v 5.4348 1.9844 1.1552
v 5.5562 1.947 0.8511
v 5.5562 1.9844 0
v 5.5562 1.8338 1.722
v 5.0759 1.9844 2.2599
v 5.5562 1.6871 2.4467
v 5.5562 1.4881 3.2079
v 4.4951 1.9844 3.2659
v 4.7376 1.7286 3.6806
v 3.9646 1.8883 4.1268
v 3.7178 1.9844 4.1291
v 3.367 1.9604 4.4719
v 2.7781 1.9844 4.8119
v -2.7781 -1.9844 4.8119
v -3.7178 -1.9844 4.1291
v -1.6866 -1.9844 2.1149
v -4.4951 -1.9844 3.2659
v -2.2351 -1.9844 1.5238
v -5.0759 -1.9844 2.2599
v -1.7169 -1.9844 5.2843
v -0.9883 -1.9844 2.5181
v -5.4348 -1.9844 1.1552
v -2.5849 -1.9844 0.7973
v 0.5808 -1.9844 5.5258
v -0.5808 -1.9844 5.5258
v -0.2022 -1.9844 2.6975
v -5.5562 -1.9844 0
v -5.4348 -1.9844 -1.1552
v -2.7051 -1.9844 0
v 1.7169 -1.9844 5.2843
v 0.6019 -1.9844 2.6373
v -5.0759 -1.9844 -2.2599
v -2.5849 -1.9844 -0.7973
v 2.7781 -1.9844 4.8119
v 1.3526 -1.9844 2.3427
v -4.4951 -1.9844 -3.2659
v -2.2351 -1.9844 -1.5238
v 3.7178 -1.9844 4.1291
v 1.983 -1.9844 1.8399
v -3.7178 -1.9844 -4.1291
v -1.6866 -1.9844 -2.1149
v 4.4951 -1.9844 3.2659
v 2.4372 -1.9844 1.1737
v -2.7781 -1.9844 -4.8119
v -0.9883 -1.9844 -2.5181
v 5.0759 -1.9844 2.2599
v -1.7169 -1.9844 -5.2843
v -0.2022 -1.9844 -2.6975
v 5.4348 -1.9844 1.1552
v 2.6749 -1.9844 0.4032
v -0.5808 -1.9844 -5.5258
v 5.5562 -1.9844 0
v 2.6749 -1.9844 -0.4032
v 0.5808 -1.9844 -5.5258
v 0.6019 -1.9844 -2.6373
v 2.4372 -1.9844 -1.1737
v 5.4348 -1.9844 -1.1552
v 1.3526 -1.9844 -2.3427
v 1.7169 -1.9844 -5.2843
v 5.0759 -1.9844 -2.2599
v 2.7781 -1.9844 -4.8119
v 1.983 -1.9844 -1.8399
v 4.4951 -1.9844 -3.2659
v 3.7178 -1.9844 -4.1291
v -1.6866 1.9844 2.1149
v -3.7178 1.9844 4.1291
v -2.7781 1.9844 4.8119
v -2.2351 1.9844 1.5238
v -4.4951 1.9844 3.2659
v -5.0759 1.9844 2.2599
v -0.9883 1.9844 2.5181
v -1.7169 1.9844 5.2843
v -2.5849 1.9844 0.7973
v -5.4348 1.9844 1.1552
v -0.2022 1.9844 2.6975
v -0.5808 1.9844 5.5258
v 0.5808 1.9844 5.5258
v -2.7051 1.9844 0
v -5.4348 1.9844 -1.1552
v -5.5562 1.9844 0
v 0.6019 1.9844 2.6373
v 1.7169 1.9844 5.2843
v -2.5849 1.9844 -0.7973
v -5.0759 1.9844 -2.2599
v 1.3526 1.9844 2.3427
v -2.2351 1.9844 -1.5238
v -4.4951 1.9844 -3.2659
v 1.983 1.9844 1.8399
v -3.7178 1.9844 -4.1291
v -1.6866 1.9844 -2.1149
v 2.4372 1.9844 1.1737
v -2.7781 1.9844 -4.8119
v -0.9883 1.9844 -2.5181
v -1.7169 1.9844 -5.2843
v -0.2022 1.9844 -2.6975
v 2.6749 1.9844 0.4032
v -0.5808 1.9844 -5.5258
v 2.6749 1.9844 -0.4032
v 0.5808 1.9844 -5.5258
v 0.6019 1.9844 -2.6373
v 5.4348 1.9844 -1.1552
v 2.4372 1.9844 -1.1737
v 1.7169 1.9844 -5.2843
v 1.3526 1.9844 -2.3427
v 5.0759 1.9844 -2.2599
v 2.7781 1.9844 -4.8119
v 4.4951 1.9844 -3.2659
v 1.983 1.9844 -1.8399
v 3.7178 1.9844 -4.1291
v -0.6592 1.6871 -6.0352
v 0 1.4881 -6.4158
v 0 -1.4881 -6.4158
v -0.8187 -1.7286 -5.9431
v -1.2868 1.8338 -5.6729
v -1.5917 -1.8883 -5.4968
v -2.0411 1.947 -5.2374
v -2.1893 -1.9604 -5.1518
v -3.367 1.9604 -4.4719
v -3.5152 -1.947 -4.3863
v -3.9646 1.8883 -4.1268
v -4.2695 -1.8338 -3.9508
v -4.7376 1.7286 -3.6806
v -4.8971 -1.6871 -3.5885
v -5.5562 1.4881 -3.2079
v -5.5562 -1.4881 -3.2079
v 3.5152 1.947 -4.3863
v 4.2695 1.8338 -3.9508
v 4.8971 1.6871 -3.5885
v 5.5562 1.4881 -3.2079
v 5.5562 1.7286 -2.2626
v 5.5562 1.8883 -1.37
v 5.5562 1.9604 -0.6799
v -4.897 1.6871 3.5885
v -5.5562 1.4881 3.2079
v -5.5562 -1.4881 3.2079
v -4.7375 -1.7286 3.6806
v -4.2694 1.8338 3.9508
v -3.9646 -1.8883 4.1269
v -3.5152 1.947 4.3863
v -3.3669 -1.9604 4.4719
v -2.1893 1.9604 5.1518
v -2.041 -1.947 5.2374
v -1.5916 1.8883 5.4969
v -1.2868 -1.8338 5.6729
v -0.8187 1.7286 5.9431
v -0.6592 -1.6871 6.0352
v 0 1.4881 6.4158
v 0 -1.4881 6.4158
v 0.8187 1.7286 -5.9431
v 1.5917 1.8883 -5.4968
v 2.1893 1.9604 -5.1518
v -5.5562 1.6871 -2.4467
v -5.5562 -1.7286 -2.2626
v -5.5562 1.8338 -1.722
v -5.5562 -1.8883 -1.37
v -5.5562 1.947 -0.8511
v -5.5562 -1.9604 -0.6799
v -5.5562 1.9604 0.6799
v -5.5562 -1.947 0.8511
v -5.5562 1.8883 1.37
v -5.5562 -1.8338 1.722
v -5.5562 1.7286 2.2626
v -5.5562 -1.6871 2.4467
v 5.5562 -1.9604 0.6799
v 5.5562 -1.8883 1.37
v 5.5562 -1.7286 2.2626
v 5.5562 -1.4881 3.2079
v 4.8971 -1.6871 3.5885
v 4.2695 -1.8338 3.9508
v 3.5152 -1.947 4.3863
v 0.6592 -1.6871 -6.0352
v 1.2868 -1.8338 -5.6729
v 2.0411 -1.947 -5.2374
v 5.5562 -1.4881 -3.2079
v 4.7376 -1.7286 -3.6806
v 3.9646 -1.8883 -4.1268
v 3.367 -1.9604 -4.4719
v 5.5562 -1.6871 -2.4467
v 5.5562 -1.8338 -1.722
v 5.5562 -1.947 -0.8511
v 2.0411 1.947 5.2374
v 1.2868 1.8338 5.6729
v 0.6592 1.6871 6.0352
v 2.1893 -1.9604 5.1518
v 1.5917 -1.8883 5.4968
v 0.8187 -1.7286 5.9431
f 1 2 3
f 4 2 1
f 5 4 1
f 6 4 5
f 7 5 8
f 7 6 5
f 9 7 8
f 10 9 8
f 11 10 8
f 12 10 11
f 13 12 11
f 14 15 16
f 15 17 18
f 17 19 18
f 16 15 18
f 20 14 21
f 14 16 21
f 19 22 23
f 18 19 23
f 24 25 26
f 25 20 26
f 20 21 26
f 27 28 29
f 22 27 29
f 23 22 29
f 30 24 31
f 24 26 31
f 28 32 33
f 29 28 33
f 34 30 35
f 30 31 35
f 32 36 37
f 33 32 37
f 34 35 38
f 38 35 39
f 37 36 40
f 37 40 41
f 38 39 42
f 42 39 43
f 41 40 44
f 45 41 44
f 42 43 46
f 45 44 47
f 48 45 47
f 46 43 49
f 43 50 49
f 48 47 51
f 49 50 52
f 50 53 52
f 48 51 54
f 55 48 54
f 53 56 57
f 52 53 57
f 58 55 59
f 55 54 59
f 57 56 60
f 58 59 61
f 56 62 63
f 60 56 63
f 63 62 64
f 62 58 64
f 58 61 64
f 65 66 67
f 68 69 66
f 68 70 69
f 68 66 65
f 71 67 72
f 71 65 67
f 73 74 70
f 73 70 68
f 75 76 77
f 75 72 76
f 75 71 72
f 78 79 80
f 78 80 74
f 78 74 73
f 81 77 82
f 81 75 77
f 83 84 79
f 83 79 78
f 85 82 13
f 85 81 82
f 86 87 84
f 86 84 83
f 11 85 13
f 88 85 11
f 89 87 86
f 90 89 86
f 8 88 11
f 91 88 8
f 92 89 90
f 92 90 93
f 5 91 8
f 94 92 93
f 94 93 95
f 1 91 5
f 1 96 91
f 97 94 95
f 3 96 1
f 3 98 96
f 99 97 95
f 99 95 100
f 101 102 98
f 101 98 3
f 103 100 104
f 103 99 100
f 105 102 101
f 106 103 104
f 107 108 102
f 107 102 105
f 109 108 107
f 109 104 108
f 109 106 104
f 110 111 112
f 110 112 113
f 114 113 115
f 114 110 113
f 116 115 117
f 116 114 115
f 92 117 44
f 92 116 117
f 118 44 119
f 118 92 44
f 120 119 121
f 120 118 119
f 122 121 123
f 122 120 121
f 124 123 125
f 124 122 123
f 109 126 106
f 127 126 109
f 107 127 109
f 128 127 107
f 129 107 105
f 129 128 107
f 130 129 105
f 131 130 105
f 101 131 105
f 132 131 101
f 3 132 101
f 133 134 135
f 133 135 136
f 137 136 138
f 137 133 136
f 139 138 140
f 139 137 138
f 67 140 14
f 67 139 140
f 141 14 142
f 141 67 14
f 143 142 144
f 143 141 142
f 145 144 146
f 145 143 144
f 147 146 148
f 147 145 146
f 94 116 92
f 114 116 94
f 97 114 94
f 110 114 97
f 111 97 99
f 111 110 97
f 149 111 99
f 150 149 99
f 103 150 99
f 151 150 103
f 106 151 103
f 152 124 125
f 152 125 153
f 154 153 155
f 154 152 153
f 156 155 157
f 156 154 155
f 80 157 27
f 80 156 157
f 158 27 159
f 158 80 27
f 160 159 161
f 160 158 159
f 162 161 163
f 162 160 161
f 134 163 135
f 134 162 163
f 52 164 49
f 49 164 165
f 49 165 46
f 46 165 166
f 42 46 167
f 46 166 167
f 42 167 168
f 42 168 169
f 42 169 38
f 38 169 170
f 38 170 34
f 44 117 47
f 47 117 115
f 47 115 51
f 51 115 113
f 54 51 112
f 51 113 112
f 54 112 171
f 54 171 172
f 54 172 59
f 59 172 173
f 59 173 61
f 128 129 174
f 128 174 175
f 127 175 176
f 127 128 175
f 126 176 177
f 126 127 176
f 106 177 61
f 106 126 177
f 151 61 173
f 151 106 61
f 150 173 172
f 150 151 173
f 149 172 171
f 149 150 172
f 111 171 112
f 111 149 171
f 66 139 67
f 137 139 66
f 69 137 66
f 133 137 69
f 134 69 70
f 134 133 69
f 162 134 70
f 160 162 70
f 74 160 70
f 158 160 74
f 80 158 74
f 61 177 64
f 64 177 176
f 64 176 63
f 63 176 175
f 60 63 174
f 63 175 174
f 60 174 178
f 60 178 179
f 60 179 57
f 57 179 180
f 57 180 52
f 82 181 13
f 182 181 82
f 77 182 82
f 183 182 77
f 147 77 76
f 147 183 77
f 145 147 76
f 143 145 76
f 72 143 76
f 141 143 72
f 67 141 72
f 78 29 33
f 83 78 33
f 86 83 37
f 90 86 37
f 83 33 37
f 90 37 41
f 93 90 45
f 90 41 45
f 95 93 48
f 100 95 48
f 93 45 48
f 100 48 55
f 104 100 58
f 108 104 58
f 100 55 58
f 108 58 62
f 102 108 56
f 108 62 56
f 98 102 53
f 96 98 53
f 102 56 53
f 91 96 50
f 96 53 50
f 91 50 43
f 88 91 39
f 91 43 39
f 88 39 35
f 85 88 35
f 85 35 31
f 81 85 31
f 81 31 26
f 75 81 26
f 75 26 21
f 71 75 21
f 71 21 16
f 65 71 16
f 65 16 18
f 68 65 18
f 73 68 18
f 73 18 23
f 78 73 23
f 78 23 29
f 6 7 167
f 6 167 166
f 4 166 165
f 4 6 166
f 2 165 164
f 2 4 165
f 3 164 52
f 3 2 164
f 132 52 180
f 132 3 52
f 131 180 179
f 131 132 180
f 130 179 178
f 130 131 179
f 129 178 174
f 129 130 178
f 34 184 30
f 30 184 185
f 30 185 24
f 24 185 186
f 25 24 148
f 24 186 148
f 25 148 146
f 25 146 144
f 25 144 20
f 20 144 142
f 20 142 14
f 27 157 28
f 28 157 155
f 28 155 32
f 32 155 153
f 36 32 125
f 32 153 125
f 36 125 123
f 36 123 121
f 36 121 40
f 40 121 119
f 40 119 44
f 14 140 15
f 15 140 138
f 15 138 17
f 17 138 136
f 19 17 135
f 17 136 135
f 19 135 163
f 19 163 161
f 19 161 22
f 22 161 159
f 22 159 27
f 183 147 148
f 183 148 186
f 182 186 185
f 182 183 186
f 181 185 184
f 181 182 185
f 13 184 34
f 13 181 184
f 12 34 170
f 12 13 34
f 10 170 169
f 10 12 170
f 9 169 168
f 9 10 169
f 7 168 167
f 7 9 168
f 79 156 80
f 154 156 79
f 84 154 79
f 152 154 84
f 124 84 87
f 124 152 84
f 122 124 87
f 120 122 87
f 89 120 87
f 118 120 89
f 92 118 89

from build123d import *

# Parameters (mm, degrees)
BOSS_EXTRUDE1_DEPTH     = 1.984375
F_1_4_28_TAPPED_HOLE1_D = 5.4102
SKETCH5_OUTSIDE_W       = 33.81
SKETCH5_OUTSIDE_H       = 35.53
SKETCH5_OUTSIDE_R       = 5.55625
CUT_EXTRUDE2_DEPTH      = 4.96875
CUT_EXTRUDE2_TAPER      = 60


with BuildPart() as part:
    # Sketch1 → Boss-Extrude1 (new body, symmetric)
    with BuildSketch(Plane(origin=(0, 0, 0), x_dir=(1, 0, 0), z_dir=(0, 1, 0))):
        Polygon((-5.55625, 3.207902433), (-5.55625, -3.207902433), (0, -6.415804866), (5.55625, -3.207902433), (5.55625, 3.207902433), (0, 6.415804866), align=None)
    extrude(amount=BOSS_EXTRUDE1_DEPTH, both=True)

    # 1/4-28 Tapped Hole1 (through all)
    with Locations(Plane(origin=(0, 1.984375, 0), x_dir=(1, 0, 0), z_dir=(0, 1, 0))):
        with Locations((0, 0)):
            Hole(F_1_4_28_TAPPED_HOLE1_D / 2)

    # Sketch5 outside → Cut-Extrude2 (cut, through all)
    with BuildSketch(Plane(origin=(0, 1.984375, 0), x_dir=(1, 0, 0), z_dir=(0, 1, 0))):
        Rectangle(SKETCH5_OUTSIDE_W, SKETCH5_OUTSIDE_H)
        Circle(SKETCH5_OUTSIDE_R, mode=Mode.SUBTRACT)
    cut_extrude2 = extrude(amount=-CUT_EXTRUDE2_DEPTH, taper=CUT_EXTRUDE2_TAPER, mode=Mode.SUBTRACT)

    # Mirror1: Cut-Extrude2 across plane
    add(cut_extrude2.mirror(Plane.ZX), mode=Mode.SUBTRACT)


solid = part.part
